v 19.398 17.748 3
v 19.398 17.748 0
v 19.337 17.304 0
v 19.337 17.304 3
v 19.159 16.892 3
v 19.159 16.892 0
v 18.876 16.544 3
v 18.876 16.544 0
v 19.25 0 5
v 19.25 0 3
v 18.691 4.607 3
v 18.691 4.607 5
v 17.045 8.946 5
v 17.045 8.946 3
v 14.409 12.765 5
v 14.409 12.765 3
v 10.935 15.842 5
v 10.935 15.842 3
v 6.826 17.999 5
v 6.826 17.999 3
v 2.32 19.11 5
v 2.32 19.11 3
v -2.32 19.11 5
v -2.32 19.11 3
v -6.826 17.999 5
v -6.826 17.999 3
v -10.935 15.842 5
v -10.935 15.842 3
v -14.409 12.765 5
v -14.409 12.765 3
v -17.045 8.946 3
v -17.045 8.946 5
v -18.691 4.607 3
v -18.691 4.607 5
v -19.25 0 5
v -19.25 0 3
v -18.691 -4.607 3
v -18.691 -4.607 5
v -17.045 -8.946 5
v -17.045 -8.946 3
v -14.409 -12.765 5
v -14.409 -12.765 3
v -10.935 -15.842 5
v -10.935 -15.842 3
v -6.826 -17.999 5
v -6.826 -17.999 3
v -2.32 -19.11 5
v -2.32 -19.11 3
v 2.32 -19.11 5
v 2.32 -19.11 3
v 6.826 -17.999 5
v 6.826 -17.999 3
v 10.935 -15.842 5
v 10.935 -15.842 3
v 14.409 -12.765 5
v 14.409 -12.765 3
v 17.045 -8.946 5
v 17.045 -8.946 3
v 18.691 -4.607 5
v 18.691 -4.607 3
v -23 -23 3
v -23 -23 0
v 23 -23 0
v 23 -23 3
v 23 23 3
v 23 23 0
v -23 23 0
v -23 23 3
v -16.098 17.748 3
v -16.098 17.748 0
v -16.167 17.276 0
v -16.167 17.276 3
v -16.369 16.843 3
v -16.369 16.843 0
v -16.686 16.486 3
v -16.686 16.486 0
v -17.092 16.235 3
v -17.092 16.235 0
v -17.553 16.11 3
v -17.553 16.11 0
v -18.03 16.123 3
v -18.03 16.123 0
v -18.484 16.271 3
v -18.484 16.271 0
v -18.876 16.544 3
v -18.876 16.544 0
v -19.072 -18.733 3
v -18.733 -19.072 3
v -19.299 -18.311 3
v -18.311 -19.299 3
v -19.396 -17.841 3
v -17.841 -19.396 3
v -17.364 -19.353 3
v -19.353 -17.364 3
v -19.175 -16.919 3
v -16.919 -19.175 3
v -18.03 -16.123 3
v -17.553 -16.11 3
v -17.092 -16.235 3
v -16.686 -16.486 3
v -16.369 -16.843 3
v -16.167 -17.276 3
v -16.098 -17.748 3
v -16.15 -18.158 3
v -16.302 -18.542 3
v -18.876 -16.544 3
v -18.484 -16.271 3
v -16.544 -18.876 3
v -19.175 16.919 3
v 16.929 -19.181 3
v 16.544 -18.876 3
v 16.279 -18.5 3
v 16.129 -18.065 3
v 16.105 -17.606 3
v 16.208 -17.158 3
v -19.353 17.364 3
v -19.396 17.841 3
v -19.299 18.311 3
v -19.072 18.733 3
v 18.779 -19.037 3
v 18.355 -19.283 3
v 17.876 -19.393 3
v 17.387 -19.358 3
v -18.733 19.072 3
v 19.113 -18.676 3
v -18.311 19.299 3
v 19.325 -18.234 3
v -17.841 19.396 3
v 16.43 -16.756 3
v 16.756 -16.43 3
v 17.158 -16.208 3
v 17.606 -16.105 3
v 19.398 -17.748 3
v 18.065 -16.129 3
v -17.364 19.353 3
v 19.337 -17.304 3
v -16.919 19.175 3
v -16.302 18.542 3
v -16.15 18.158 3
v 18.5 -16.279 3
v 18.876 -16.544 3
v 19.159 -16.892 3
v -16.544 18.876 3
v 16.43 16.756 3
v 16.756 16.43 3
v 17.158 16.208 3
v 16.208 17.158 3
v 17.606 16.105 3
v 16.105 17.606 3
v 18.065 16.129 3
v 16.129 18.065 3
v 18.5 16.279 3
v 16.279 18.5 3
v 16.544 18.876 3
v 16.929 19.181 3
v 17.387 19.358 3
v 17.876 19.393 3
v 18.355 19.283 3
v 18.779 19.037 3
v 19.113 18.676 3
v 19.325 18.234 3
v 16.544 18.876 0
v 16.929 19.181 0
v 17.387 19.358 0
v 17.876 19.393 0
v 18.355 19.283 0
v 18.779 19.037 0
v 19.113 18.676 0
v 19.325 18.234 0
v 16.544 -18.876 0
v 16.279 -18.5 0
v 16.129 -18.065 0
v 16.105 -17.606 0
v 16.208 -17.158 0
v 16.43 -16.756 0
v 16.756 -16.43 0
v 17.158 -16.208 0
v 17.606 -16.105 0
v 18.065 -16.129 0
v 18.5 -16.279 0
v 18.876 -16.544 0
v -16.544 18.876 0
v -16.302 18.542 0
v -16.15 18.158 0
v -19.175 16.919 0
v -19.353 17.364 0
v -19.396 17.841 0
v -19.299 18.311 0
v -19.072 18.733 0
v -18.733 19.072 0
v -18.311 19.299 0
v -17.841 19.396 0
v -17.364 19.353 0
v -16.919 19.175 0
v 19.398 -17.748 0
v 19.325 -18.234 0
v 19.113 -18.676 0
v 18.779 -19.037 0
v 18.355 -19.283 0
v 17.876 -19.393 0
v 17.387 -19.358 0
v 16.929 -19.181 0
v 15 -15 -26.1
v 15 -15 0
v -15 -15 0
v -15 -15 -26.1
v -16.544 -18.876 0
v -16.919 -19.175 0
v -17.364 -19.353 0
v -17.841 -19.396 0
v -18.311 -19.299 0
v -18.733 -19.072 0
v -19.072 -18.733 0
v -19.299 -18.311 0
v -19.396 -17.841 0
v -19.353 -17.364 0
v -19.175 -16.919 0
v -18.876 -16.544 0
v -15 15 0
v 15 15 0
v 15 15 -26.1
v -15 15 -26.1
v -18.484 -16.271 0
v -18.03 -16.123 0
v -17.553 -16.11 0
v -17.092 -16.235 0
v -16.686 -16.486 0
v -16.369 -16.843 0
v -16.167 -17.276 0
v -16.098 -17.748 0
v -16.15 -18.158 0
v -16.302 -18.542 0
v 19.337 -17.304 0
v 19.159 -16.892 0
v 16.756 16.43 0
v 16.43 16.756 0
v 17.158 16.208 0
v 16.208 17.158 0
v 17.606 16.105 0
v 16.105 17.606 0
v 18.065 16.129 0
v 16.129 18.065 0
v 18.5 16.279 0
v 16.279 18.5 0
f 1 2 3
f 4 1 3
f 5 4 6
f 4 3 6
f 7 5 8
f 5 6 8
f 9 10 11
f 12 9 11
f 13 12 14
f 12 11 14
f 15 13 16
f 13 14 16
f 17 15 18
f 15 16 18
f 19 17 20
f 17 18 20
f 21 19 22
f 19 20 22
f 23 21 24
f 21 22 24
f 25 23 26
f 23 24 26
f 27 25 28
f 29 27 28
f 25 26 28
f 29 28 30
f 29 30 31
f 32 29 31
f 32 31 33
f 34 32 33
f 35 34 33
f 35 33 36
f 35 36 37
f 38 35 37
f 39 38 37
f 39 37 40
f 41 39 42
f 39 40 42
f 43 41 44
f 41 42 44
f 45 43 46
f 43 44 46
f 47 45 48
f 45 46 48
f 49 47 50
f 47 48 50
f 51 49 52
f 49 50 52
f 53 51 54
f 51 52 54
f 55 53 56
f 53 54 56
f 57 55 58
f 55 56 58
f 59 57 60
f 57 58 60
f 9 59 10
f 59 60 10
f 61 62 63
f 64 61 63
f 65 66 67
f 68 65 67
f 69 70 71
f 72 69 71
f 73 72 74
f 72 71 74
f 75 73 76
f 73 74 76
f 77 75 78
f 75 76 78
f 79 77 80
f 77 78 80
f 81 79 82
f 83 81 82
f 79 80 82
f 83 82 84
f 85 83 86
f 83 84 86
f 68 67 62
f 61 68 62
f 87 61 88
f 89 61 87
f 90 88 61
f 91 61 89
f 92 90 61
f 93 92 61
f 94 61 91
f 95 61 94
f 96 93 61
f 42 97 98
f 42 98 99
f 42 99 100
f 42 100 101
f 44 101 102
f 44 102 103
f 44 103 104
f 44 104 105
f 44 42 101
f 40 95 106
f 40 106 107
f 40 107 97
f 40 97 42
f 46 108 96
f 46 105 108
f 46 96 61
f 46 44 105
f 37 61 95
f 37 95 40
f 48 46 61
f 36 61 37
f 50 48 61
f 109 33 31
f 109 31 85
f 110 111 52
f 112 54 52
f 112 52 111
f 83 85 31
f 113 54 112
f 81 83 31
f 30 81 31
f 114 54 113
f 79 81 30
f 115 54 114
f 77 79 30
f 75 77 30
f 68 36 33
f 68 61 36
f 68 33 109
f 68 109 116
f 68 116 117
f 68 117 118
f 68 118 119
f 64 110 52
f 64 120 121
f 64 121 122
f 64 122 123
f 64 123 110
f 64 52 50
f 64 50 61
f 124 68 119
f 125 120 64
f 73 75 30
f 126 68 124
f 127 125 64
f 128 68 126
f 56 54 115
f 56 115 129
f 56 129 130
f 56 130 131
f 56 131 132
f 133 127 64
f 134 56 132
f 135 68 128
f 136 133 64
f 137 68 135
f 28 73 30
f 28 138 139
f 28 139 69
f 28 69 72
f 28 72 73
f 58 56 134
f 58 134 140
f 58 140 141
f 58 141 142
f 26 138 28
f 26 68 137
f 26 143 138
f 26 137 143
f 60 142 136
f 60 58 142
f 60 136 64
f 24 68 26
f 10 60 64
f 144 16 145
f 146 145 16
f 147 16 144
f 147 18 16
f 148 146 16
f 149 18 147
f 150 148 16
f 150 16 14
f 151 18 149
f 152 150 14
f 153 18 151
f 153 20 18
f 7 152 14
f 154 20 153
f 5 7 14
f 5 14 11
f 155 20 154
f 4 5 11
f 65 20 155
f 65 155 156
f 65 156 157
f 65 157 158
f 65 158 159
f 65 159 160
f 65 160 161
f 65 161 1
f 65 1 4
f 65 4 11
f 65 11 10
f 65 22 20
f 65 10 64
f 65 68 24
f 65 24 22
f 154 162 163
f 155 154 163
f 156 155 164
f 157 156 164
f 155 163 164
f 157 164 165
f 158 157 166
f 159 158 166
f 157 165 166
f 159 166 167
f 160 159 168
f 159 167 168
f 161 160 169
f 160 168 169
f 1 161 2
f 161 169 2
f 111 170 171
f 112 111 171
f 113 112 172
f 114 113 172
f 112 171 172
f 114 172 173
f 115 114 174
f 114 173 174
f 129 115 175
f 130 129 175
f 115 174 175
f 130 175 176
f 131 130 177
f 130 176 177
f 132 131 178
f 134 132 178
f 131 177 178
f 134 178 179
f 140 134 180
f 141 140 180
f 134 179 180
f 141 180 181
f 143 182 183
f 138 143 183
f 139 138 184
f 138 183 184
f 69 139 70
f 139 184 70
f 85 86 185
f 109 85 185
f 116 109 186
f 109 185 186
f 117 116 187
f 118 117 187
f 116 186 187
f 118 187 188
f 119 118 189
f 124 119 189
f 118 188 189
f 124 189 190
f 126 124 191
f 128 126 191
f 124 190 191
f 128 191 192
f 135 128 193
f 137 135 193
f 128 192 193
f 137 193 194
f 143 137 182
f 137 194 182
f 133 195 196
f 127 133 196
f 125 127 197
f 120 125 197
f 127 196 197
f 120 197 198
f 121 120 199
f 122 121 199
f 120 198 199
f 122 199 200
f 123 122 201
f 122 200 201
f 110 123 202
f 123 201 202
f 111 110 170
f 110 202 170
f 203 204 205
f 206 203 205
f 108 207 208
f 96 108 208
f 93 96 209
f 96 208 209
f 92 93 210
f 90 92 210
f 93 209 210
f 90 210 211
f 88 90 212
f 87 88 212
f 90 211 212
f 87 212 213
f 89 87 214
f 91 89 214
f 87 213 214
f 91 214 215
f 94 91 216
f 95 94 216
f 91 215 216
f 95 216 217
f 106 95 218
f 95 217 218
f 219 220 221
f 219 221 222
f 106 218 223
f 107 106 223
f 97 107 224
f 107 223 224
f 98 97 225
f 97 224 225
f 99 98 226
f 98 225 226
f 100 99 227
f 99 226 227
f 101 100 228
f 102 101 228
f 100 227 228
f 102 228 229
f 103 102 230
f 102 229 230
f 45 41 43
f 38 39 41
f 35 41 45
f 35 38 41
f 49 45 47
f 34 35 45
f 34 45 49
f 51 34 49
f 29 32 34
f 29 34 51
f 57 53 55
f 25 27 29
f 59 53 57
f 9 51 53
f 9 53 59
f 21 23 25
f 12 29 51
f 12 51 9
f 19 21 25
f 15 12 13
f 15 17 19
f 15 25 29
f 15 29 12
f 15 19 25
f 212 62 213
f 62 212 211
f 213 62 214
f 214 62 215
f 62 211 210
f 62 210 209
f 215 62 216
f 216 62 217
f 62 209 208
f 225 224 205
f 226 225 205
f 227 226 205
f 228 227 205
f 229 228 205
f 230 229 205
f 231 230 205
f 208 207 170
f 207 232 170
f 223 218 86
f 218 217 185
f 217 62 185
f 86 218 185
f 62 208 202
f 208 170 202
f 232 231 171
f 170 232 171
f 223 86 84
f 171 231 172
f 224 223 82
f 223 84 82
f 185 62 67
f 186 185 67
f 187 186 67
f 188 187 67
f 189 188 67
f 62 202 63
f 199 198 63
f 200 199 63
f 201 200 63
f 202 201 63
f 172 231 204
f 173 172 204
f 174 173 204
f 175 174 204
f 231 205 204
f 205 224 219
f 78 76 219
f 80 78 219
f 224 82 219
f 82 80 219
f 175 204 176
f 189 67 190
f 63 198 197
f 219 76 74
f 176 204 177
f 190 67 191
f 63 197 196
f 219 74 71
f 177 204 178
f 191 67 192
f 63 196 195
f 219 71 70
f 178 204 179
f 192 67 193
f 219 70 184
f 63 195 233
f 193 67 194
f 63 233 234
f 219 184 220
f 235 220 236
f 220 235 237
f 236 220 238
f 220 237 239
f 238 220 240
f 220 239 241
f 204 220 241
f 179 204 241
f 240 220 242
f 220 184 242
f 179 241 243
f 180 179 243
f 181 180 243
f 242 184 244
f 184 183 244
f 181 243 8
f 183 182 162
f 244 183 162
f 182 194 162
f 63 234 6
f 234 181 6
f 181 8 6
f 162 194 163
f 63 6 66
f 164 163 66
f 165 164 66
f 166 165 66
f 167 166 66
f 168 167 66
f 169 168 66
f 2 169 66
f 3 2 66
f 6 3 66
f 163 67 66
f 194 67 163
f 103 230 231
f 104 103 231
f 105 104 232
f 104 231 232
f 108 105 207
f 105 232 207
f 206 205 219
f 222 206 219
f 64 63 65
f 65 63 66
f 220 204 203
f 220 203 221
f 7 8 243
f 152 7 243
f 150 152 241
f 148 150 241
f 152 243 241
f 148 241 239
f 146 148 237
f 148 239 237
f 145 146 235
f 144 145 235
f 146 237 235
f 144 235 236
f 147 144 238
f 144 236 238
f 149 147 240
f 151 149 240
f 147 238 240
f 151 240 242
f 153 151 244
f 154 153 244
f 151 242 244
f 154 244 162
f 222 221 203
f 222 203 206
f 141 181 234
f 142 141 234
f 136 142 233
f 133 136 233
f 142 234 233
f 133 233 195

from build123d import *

# Parameters (mm, degrees)
SKETCH1_R           = 20
BOSS_EXTRUDE1_DEPTH = 3
SKETCH2_R           = 19.25
BOSS_EXTRUDE2_DEPTH = 2
SKETCH3_W           = 30
SKETCH3_H           = 30
BOSS_EXTRUDE3_DEPTH = 26.1


with BuildPart() as part:
    # Sketch1 → Boss-Extrude1 (new body)
    # profile 1 of 6: a face of its own
    with BuildSketch(Plane.XY):
        with BuildLine():
            Line((10.050373127, 23), (-10.050373127, 23))
            ThreePointArc((-10.050373127, 23), (-13.456072932, 21.188301047), (-16.54393585, 18.876127426))
            ThreePointArc((-16.54393585, 18.876127426), (-16.213806457, 18.354666777), (-16.098380208, 17.748380208))
            ThreePointArc((-16.098380208, 17.748380208), (-17.091982047, 16.234563358), (-18.876127426, 16.54393585))
            ThreePointArc((-18.876127426, 16.54393585), (-21.188301047, 13.456072932), (-23, 10.050373127))
            Line((-23, 10.050373127), (-23, -10.050373127))
            ThreePointArc((-23, -10.050373127), (-21.188301047, -13.456072932), (-18.876127426, -16.54393585))
            ThreePointArc((-18.876127426, -16.54393585), (-17.091982047, -16.234563358), (-16.098380208, -17.748380208))
            ThreePointArc((-16.098380208, -17.748380208), (-16.213806457, -18.354666777), (-16.54393585, -18.876127426))
            ThreePointArc((-16.54393585, -18.876127426), (-13.456072932, -21.188301047), (-10.050373127, -23))
            Line((-10.050373127, -23), (10.050373127, -23))
            ThreePointArc((10.050373127, -23), (13.456072932, -21.188301047), (16.54393585, -18.876127426))
            ThreePointArc((16.54393585, -18.876127426), (16.581654019, -16.581654019), (18.876127426, -16.54393585))
            ThreePointArc((18.876127426, -16.54393585), (21.188301047, -13.456072932), (23, -10.050373127))
            Line((23, -10.050373127), (23, 10.050373127))
            ThreePointArc((23, 10.050373127), (21.188301047, 13.456072932), (18.876127426, 16.54393585))
            ThreePointArc((18.876127426, 16.54393585), (16.581654019, 16.581654019), (16.54393585, 18.876127426))
            ThreePointArc((16.54393585, 18.876127426), (13.456072932, 21.188301047), (10.050373127, 23))
        make_face()
        Circle(SKETCH1_R, mode=Mode.SUBTRACT)
    # profile 2 of 6: a face of its own
    with BuildSketch(Plane.XY):
        Circle(SKETCH1_R)
    # profile 3 of 6: a face of its own
    with BuildSketch(Plane.XY):
        with BuildLine():
            Line((23, 23), (10.050373127, 23))
            ThreePointArc((10.050373127, 23), (13.456072932, 21.188301047), (16.54393585, 18.876127426))
            ThreePointArc((16.54393585, 18.876127426), (18.354666777, 19.282953958), (19.398380208, 17.748380208))
            ThreePointArc((19.398380208, 17.748380208), (19.262197058, 17.091982047), (18.876127426, 16.54393585))
            ThreePointArc((18.876127426, 16.54393585), (21.188301047, 13.456072932), (23, 10.050373127))
            Line((23, 10.050373127), (23, 23))
        make_face()
    # profile 4 of 6: a face of its own
    with BuildSketch(Plane.XY):
        with BuildLine():
            Line((-10.050373127, 23), (-23, 23))
            Line((-23, 23), (-23, 10.050373127))
            ThreePointArc((-23, 10.050373127), (-21.188301047, 13.456072932), (-18.876127426, 16.54393585))
            ThreePointArc((-18.876127426, 16.54393585), (-18.915106397, 18.915106397), (-16.54393585, 18.876127426))
            ThreePointArc((-16.54393585, 18.876127426), (-13.456072932, 21.188301047), (-10.050373127, 23))
        make_face()
    # profile 5 of 6: a face of its own
    with BuildSketch(Plane.XY):
        with BuildLine():
            Line((23, -23), (23, -10.050373127))
            ThreePointArc((23, -10.050373127), (21.188301047, -13.456072932), (18.876127426, -16.54393585))
            ThreePointArc((18.876127426, -16.54393585), (19.262197058, -17.091982047), (19.398380208, -17.748380208))
            ThreePointArc((19.398380208, -17.748380208), (18.354666777, -19.282953958), (16.54393585, -18.876127426))
            ThreePointArc((16.54393585, -18.876127426), (13.456072932, -21.188301047), (10.050373127, -23))
            Line((10.050373127, -23), (23, -23))
        make_face()
    # profile 6 of 6: a face of its own
    with BuildSketch(Plane.XY):
        with BuildLine():
            ThreePointArc((-18.876127426, -16.54393585), (-21.188301047, -13.456072932), (-23, -10.050373127))
            Line((-23, -10.050373127), (-23, -23))
            Line((-23, -23), (-10.050373127, -23))
            ThreePointArc((-10.050373127, -23), (-13.456072932, -21.188301047), (-16.54393585, -18.876127426))
            ThreePointArc((-16.54393585, -18.876127426), (-18.915106397, -18.915106397), (-18.876127426, -16.54393585))
        make_face()
    extrude(amount=BOSS_EXTRUDE1_DEPTH)

    # Sketch2 → Boss-Extrude2 (add)
    with BuildSketch(Plane.XY.offset(3)):
        Circle(SKETCH2_R)
    extrude(amount=BOSS_EXTRUDE2_DEPTH)

    # Sketch3 → Boss-Extrude3 (add)
    with BuildSketch(Plane(origin=(0, 0, 0), x_dir=(-1, 0, 0), z_dir=(0, 0, -1))):
        Rectangle(SKETCH3_W, SKETCH3_H)
    extrude(amount=BOSS_EXTRUDE3_DEPTH)


solid = part.part
